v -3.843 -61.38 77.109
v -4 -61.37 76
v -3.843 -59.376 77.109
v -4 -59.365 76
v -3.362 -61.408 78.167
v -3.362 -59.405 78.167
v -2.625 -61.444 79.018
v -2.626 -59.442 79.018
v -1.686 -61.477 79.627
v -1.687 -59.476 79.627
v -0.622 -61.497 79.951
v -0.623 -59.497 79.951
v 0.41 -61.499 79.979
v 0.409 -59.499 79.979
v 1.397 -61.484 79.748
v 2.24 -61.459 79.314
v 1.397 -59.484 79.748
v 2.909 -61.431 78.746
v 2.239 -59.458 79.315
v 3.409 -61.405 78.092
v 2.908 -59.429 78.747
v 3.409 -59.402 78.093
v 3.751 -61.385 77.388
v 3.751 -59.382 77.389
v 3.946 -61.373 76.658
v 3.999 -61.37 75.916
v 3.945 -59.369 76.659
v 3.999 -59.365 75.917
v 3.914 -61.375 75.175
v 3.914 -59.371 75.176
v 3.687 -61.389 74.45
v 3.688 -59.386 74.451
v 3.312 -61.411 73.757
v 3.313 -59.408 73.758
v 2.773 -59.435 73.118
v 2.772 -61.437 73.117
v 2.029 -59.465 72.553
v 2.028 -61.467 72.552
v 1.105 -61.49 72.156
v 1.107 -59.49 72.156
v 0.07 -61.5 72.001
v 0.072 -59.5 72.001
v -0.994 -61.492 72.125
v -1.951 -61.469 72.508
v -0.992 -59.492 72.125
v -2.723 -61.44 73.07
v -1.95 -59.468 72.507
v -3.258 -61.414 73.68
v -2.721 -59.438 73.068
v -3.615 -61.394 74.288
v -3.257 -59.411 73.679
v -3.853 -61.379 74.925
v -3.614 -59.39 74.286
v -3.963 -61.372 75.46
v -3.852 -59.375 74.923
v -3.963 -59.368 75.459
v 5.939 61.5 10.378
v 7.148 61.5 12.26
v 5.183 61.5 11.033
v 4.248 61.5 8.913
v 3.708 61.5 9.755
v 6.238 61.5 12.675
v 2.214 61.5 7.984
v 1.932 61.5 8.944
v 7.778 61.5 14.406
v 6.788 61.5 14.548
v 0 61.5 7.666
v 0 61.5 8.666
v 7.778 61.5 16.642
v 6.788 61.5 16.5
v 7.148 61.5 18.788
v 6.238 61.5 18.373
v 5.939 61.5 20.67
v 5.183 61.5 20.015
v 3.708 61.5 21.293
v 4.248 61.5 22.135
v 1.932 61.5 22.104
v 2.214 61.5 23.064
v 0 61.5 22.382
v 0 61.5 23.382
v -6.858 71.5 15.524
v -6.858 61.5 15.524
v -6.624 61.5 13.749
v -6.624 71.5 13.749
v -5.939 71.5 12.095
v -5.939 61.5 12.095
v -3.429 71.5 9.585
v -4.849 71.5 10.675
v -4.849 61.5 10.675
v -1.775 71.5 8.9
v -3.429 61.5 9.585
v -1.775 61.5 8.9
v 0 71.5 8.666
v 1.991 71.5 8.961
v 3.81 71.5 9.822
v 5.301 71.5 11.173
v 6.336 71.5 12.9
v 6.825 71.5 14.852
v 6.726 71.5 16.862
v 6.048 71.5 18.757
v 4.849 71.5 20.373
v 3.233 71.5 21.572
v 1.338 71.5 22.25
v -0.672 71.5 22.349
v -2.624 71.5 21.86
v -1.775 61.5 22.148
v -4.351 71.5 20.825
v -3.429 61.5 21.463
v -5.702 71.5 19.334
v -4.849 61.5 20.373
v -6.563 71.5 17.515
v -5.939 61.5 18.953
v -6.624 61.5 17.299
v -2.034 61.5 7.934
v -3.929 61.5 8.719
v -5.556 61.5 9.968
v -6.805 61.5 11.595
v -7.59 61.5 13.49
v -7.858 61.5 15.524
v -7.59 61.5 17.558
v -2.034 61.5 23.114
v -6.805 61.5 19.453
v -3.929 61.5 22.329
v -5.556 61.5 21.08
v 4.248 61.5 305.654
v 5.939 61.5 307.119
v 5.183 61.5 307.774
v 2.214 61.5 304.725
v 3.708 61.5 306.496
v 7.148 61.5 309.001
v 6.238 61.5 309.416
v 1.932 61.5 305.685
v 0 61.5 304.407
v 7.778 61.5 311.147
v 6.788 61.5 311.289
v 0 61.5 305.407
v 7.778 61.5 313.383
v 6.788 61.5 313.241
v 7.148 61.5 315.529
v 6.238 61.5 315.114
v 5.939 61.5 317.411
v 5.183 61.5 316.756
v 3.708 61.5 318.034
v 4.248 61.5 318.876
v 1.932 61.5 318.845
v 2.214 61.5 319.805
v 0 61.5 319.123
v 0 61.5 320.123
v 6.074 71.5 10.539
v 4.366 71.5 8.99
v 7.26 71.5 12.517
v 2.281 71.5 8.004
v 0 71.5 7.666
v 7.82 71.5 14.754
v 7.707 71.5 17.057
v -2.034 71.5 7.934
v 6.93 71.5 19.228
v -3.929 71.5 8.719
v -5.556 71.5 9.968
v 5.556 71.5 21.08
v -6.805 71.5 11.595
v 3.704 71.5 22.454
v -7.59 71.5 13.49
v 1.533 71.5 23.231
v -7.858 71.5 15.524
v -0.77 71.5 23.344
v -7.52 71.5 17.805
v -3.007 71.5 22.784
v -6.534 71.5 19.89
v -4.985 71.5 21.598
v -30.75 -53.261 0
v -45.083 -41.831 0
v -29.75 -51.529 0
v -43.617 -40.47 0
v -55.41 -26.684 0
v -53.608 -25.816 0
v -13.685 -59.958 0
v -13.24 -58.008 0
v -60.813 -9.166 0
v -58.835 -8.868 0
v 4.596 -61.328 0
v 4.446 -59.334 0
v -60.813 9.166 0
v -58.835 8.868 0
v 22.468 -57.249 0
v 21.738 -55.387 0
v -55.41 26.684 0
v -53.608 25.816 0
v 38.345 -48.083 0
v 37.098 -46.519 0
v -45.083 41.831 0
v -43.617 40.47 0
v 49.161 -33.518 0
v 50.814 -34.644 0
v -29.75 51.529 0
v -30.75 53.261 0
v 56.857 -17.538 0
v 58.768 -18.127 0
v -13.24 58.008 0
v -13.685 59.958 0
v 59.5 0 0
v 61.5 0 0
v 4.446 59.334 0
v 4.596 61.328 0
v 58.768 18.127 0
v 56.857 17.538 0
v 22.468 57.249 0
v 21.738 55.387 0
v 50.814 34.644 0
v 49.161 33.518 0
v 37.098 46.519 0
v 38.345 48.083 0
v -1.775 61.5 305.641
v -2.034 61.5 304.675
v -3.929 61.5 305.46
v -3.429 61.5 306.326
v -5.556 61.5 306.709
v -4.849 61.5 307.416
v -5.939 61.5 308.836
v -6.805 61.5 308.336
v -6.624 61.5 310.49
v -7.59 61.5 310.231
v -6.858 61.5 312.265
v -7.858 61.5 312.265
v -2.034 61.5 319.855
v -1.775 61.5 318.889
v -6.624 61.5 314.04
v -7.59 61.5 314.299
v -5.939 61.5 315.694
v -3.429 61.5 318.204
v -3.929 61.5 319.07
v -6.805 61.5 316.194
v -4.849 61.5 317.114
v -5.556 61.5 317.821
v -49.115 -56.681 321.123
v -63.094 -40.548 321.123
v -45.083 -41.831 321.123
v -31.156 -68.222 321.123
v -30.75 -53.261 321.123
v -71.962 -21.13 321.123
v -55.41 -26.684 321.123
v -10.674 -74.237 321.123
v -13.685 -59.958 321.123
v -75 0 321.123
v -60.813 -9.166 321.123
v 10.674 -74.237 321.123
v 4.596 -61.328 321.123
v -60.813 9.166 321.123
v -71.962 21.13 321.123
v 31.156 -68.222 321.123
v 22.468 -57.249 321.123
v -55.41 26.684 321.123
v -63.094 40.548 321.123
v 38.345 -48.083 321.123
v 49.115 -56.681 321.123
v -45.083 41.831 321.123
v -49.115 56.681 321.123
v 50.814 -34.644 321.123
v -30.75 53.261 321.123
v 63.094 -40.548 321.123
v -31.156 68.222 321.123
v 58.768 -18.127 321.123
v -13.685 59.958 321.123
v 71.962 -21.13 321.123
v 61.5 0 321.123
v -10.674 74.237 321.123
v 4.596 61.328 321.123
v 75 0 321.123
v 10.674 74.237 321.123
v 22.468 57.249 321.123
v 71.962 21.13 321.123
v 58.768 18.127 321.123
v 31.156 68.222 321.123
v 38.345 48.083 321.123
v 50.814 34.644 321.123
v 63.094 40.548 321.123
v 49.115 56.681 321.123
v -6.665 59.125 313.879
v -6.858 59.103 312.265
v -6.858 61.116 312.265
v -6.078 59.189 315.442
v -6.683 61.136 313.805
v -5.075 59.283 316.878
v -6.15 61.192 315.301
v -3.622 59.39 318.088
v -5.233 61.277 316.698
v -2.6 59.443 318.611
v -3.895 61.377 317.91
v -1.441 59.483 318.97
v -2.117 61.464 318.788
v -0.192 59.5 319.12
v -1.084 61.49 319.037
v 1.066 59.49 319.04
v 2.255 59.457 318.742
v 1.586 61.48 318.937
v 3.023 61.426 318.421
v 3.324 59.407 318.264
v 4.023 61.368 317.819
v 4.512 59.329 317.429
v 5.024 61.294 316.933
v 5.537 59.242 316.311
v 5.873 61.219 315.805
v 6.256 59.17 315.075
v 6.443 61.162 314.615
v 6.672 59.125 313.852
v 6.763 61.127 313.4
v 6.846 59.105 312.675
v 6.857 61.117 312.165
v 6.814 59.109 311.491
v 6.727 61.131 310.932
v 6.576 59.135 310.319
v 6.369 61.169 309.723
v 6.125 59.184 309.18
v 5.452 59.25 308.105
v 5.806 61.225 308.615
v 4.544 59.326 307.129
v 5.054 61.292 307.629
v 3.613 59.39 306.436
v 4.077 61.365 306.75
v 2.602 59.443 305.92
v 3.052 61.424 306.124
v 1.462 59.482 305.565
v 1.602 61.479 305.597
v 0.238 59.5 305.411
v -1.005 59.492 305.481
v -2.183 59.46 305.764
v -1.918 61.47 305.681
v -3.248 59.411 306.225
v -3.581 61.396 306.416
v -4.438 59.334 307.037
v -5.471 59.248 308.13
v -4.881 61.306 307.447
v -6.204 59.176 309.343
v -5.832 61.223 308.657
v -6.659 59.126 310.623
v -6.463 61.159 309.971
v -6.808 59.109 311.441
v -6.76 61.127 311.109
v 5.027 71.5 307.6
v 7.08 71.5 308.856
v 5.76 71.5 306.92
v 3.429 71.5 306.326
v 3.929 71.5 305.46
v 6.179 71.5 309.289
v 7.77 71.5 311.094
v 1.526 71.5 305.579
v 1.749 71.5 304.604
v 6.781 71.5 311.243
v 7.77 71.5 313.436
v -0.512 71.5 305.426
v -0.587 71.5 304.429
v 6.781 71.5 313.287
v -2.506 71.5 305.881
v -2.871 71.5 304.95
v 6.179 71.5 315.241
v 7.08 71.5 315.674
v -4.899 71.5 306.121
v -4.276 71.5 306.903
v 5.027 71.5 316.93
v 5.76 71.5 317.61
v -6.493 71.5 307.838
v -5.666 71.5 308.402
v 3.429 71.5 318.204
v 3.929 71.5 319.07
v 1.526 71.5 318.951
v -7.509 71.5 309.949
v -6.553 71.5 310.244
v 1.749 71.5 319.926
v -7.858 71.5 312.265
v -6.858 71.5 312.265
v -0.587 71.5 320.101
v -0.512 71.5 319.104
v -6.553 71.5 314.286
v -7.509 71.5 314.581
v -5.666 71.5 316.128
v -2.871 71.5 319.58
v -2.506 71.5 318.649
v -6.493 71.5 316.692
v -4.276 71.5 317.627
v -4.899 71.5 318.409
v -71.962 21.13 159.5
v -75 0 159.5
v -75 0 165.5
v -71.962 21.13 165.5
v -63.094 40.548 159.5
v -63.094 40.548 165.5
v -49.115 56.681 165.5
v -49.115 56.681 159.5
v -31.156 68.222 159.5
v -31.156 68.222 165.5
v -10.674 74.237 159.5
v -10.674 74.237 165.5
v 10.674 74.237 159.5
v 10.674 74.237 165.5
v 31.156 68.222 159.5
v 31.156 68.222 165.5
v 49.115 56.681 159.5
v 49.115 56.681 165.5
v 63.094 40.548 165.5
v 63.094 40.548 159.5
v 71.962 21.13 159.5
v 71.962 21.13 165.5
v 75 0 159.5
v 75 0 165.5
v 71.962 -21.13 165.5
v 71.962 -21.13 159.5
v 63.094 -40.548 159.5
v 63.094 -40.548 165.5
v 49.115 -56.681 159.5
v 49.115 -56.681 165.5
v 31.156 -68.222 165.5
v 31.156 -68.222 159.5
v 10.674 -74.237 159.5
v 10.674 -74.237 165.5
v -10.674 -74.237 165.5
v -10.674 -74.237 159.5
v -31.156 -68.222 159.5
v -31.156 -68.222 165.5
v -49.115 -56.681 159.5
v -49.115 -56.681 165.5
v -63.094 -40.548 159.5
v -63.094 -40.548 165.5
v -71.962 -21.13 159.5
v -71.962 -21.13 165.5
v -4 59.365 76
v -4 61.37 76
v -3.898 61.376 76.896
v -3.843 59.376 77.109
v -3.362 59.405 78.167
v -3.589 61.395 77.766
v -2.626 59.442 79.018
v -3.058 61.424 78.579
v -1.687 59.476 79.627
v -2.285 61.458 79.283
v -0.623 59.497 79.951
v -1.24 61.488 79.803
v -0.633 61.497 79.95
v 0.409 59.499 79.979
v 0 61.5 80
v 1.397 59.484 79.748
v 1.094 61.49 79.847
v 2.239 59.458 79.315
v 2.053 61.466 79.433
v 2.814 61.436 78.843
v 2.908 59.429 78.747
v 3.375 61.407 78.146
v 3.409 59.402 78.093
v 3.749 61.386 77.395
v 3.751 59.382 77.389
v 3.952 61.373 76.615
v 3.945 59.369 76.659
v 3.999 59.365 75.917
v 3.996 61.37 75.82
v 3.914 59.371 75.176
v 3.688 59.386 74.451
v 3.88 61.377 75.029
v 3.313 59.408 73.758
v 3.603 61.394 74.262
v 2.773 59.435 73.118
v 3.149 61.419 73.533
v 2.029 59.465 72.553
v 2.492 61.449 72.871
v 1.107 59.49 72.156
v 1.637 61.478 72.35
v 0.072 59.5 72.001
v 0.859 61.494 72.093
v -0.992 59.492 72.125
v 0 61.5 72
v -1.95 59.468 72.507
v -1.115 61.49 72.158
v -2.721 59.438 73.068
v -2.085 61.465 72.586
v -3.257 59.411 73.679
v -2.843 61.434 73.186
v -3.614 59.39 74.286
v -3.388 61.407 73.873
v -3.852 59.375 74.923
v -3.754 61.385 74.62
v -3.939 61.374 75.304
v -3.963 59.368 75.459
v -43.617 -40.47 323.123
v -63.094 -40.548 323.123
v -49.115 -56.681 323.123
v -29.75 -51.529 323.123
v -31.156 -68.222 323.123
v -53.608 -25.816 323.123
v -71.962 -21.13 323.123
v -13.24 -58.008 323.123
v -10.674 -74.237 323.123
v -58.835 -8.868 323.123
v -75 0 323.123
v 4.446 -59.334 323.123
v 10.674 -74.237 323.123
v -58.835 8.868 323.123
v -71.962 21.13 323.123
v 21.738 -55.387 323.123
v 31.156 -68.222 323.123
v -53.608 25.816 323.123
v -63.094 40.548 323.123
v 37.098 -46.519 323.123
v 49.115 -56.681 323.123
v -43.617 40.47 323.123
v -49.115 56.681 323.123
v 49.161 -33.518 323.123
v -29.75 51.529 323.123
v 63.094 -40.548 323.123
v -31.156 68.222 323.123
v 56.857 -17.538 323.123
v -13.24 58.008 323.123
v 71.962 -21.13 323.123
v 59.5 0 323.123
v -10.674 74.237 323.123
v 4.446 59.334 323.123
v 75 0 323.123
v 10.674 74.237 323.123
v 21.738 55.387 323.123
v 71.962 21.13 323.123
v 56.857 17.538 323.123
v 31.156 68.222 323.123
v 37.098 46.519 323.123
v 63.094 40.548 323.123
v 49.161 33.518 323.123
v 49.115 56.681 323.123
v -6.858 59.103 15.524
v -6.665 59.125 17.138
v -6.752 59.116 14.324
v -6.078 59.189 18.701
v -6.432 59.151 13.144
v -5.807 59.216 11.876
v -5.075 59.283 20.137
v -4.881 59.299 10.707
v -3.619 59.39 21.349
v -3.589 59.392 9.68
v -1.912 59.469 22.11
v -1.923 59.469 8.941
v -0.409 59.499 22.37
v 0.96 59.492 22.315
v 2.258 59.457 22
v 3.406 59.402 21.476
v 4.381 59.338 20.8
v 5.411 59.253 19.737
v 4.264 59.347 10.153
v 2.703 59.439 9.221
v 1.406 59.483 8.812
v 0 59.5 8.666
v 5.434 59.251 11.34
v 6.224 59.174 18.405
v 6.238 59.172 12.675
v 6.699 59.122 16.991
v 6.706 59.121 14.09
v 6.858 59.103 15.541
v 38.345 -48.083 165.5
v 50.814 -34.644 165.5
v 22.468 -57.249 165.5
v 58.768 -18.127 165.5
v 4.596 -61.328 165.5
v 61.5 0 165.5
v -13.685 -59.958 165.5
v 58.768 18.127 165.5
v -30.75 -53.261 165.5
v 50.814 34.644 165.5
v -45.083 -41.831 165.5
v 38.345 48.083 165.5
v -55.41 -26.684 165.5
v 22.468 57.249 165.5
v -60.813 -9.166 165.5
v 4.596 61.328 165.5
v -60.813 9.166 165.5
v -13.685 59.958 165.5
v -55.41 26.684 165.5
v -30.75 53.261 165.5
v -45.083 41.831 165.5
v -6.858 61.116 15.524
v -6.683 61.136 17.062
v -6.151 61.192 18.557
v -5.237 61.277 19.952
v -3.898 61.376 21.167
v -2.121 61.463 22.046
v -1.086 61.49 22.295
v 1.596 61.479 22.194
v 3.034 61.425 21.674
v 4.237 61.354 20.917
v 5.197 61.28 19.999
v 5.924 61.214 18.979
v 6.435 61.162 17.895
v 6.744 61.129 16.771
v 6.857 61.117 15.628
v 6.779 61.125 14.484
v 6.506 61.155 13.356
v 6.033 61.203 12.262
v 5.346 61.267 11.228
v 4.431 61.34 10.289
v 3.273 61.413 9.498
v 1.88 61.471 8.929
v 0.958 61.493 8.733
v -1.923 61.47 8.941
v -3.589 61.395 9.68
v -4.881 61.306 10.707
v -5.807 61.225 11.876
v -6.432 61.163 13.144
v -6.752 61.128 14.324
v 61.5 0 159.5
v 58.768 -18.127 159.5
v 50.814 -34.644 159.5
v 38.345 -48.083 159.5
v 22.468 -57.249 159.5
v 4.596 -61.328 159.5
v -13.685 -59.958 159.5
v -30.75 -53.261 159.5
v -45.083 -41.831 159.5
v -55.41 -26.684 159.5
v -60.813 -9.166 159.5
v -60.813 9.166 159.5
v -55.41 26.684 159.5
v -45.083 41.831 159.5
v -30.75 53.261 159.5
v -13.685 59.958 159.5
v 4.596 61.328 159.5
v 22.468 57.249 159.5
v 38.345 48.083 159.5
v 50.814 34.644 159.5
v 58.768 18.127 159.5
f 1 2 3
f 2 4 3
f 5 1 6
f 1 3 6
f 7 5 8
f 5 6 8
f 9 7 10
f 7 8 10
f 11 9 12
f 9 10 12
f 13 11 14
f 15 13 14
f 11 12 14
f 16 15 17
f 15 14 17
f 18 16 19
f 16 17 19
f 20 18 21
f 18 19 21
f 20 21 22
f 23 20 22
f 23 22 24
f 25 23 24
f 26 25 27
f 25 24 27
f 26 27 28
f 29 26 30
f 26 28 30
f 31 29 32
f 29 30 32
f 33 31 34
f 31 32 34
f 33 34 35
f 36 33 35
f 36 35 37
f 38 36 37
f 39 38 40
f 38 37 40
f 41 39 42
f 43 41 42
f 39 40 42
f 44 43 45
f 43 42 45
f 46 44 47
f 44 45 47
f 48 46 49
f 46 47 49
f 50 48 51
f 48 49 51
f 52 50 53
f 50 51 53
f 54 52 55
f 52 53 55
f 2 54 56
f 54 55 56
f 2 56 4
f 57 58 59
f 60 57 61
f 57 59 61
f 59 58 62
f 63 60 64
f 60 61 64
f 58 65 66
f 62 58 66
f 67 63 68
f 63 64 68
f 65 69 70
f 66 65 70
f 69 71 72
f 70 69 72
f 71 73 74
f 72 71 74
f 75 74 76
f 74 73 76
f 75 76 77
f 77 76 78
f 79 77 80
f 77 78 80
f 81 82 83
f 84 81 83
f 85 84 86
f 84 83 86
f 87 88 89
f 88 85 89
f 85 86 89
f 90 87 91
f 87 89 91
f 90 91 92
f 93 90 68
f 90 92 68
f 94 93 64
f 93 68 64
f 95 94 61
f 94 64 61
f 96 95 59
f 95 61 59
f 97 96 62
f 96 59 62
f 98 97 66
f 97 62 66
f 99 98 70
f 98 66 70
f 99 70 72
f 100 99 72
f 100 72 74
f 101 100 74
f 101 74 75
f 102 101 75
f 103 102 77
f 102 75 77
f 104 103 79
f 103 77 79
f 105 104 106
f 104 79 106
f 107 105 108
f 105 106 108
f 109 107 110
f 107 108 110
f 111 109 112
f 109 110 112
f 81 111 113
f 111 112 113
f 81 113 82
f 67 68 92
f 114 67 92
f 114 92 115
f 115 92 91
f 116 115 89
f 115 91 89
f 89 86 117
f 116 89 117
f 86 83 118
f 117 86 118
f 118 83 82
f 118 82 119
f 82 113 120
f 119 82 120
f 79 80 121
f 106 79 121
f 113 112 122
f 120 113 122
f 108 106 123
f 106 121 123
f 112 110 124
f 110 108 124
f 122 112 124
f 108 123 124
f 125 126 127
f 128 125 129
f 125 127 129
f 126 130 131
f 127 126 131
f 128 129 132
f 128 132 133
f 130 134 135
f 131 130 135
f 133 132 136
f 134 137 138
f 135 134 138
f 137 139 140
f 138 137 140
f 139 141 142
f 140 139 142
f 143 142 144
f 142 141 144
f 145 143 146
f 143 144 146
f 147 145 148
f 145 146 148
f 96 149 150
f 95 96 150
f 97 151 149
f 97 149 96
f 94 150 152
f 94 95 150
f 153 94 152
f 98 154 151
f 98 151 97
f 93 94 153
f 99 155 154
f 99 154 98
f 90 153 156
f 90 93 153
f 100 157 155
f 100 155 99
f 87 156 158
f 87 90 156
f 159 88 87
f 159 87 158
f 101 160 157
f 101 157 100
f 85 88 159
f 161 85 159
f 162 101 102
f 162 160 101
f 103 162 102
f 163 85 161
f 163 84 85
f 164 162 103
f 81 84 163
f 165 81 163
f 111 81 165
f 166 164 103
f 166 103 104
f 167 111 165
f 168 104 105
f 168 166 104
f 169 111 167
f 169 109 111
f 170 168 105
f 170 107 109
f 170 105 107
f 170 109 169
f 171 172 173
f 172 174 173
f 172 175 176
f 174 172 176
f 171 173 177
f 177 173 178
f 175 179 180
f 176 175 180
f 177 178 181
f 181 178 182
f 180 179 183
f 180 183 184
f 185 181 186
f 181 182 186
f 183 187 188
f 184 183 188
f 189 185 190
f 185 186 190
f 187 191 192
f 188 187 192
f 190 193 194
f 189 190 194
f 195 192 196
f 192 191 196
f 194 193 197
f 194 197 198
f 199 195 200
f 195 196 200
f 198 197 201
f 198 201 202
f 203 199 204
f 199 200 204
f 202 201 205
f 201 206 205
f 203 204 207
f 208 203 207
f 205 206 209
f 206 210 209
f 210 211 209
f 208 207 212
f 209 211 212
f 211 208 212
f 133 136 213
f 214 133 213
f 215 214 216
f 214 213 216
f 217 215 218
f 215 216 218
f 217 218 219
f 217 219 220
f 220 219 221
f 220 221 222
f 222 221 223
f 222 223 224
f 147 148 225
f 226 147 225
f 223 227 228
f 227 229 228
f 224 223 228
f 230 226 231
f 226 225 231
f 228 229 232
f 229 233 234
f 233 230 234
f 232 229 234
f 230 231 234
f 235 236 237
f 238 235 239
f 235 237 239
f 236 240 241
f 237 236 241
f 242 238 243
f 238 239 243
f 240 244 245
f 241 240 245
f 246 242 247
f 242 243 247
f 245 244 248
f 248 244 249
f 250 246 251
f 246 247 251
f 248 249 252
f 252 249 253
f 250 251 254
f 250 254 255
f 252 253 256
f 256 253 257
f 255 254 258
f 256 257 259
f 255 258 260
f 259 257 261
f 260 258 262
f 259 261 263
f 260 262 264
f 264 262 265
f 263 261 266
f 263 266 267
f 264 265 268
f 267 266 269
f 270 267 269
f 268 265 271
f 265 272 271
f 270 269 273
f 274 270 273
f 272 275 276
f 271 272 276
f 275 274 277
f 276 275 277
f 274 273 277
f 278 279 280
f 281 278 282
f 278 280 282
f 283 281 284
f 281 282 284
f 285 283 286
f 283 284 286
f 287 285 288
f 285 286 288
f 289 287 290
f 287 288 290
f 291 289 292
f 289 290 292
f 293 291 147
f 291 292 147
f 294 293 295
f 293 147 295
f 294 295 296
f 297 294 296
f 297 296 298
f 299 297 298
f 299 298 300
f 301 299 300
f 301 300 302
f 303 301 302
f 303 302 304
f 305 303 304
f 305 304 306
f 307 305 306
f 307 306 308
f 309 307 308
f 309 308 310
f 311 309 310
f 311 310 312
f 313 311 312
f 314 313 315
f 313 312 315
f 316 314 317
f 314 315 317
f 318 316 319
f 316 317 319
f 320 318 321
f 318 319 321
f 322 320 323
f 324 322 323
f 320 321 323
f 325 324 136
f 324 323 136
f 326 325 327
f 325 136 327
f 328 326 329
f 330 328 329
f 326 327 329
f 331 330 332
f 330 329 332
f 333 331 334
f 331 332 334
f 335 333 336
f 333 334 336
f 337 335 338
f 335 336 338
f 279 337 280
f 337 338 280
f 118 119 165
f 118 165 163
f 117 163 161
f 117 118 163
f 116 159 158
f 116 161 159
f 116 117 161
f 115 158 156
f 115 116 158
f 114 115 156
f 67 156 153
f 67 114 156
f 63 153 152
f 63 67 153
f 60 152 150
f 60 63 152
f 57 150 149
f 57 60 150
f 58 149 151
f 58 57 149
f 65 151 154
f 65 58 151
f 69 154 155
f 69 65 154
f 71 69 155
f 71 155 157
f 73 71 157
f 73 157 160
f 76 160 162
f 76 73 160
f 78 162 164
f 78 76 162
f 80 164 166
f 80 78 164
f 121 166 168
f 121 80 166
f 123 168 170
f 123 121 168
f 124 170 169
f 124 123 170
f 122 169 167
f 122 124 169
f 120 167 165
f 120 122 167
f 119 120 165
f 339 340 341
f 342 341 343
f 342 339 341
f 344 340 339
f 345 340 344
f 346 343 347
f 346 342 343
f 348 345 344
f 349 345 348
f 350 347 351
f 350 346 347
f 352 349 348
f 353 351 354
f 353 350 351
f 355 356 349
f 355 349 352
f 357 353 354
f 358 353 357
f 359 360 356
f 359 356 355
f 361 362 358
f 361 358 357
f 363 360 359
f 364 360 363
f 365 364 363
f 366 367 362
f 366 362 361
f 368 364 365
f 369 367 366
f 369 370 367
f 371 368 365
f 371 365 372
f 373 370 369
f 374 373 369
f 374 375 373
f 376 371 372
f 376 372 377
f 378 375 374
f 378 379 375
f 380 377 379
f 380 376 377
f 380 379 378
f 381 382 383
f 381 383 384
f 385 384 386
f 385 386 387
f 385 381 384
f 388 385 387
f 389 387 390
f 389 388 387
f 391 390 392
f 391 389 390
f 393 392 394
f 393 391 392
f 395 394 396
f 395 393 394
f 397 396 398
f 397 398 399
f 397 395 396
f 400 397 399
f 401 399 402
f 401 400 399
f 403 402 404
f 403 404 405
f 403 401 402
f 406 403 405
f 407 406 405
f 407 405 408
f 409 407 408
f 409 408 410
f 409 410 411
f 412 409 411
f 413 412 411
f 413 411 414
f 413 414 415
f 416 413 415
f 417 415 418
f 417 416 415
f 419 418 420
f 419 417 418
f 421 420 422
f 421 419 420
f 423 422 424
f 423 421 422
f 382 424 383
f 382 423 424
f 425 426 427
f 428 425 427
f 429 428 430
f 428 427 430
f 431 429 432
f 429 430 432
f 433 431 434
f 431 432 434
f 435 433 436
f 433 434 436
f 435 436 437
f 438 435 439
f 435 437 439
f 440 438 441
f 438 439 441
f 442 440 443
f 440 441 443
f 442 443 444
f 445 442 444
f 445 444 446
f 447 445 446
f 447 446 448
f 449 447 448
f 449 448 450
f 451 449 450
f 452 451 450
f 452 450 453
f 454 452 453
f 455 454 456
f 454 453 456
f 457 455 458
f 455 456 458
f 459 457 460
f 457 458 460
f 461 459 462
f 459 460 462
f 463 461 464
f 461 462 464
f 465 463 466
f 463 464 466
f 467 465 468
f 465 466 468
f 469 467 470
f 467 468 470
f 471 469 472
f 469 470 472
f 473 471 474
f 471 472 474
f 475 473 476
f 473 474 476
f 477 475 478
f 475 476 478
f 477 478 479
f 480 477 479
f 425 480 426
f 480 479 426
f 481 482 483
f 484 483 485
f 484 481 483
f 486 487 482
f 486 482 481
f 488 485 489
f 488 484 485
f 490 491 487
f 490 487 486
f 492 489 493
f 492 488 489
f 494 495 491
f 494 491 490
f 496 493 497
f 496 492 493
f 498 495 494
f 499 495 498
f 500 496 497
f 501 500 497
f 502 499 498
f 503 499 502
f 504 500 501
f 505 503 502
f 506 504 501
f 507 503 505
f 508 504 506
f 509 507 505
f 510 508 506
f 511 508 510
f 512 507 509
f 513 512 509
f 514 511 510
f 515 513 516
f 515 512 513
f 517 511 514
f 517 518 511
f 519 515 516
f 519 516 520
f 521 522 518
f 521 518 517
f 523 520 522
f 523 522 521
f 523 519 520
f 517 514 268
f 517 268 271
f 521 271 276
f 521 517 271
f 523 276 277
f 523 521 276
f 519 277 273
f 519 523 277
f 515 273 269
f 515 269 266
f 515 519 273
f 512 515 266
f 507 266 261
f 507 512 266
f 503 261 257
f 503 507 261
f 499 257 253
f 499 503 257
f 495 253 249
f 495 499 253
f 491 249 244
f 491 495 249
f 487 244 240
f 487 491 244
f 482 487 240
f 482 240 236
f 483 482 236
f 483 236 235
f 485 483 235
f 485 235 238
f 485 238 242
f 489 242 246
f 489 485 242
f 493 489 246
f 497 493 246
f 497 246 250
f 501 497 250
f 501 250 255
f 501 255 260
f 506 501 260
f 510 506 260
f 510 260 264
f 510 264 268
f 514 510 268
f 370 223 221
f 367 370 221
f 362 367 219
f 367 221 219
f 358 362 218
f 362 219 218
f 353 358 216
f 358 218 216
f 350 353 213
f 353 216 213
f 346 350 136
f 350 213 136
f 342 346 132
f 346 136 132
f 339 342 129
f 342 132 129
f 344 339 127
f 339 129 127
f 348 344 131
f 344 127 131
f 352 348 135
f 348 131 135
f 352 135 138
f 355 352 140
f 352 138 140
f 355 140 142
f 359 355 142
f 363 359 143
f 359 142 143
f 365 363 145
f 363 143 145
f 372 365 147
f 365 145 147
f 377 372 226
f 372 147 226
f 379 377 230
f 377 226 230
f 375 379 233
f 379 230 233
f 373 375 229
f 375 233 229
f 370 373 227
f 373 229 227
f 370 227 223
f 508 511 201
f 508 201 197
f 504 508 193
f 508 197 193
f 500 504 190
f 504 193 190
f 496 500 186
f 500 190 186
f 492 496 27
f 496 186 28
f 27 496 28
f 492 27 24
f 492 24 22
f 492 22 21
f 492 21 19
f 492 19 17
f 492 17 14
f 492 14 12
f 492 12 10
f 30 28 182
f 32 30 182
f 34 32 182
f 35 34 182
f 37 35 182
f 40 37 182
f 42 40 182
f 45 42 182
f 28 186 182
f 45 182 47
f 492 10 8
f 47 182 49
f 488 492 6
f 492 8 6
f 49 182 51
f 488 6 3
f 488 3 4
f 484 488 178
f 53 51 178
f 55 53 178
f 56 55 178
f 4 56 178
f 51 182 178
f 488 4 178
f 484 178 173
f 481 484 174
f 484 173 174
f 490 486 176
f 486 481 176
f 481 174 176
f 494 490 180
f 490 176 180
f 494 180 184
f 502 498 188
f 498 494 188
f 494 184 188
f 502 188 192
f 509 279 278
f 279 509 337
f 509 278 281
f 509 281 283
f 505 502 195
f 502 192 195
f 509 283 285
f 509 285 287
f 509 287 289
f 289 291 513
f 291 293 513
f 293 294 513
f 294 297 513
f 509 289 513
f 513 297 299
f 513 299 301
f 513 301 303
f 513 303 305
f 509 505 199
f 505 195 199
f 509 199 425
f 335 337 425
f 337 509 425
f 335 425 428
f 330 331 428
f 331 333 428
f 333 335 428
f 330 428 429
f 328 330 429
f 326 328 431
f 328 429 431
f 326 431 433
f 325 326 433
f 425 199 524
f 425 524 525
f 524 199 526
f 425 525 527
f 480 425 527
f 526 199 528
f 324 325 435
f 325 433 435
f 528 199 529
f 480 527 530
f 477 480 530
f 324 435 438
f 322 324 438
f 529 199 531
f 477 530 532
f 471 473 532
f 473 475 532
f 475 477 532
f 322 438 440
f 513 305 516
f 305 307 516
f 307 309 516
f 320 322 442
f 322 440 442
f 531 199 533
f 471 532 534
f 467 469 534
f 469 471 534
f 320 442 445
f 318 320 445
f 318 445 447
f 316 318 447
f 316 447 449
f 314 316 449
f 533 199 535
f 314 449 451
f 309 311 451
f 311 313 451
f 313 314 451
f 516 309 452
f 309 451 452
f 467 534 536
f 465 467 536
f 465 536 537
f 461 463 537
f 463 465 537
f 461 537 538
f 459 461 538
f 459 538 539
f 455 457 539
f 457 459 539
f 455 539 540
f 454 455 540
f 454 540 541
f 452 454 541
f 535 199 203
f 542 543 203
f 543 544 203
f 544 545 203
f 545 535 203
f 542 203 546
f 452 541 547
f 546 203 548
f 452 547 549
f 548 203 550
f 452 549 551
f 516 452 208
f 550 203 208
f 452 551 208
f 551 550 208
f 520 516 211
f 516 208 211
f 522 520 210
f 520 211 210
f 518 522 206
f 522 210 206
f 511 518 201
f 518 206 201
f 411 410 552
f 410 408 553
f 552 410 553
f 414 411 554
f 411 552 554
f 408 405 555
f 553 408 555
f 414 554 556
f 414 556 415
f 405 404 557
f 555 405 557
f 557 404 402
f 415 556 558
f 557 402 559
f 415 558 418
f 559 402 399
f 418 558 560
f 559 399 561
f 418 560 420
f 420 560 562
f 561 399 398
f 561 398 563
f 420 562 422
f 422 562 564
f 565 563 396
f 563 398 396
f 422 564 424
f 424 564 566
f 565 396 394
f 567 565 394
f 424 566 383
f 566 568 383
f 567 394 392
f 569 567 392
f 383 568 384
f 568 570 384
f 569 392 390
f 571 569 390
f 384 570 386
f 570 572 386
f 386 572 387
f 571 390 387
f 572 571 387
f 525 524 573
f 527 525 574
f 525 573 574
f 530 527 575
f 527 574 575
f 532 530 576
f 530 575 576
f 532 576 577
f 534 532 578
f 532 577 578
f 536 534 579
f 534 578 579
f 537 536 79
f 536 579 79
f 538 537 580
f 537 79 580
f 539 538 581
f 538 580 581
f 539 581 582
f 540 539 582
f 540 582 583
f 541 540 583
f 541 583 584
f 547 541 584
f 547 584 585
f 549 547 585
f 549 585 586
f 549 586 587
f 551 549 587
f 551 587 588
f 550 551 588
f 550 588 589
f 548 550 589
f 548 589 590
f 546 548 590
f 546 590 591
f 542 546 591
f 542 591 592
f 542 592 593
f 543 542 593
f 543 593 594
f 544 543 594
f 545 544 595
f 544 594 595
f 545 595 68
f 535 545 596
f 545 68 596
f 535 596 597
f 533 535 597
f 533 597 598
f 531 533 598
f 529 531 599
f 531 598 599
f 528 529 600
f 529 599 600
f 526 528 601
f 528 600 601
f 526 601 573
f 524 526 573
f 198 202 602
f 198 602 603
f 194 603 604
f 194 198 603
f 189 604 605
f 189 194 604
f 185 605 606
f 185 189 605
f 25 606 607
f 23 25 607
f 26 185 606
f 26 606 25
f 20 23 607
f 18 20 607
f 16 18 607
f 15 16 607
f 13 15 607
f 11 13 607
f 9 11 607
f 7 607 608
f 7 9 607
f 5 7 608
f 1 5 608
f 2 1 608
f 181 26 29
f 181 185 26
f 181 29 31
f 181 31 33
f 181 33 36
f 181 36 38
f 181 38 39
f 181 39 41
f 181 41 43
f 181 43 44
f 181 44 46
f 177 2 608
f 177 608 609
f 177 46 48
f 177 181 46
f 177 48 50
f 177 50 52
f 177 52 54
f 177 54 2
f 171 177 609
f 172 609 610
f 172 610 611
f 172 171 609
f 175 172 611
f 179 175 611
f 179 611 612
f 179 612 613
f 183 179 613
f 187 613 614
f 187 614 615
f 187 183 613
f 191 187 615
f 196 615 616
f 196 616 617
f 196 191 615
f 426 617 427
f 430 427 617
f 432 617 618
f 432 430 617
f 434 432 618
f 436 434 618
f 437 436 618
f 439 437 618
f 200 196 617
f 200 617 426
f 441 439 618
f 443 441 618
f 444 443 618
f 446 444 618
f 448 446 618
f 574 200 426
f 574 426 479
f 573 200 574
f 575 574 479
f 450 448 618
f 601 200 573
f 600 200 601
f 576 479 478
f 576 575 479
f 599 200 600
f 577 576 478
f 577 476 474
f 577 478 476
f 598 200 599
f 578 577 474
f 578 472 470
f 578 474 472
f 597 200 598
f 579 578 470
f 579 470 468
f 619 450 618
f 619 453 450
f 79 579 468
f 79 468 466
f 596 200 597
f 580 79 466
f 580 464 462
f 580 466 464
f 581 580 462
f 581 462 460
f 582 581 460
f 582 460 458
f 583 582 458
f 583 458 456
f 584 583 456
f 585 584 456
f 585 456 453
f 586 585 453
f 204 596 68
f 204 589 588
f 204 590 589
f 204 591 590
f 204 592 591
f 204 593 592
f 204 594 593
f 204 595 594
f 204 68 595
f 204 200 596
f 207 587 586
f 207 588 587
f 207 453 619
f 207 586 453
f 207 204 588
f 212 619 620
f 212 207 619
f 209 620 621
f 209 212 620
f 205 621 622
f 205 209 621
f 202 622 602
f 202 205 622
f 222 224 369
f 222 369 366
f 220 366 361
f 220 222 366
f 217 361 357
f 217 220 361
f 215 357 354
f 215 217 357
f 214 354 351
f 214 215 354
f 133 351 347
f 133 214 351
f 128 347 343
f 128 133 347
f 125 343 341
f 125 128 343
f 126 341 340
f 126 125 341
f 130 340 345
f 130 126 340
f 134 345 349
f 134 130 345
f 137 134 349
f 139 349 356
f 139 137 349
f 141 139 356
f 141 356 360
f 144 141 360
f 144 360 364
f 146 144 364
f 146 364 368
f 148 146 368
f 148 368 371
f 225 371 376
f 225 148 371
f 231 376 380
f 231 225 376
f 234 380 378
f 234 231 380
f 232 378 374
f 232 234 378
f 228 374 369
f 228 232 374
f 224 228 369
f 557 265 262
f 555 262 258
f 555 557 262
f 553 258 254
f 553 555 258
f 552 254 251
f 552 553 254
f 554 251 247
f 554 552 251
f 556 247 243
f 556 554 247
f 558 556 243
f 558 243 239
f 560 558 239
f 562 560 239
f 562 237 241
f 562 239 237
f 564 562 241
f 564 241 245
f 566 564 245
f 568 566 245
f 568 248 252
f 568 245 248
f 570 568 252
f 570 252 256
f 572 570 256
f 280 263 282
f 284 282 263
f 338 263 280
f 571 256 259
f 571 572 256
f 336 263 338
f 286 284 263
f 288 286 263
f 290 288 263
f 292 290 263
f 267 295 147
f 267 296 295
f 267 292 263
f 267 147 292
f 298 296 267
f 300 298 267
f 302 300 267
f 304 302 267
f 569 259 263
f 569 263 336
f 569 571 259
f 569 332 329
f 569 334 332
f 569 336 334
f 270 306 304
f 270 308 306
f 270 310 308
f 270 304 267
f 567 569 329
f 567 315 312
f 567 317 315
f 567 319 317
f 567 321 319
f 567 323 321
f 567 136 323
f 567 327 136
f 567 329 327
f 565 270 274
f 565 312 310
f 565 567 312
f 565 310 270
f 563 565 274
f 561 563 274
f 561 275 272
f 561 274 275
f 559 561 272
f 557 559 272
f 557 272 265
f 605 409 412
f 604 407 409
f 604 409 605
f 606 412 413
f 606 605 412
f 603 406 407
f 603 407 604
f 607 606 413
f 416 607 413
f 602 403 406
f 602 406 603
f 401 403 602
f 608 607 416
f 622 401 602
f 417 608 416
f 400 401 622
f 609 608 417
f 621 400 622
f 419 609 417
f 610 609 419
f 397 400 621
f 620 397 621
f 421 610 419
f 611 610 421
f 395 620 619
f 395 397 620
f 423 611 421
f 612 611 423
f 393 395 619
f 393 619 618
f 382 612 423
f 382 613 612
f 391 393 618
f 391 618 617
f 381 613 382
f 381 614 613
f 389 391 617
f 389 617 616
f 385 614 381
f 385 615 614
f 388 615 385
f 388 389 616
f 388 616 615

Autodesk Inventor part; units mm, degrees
ref_plane "YZ Plane" through (0, 0, 0) normal (1, 0, 0) x (0, 1, 0)
ref_plane "XY Plane" through (0, 0, 0) normal (0, 0, 1) x (1, 0, 0)
sketch "Sketch1" plane through (0, 0, 0) normal (0, 0, 1) x (1, 0, 0)
  circle A0 centre (0, 0) radius 59.5
  circle A1 centre (0, 0) radius 61.5
  dimension "d0" = 119
  dimension "d1" = 123
extrude "Extrusion1" add sketch "Sketch1" along normal blind 323.123
ref_plane "Work Plane1" through (0, 61.5, 0) normal (0, 1, 0) x (-1, 0, 0)
sketch "Sketch2" plane through (0, 61.5, 0) normal (0, 1, 0) x (-1, 0, 0)
  line L0 (61.5, 0) -> (-61.5, 0) projected
  line L1 (0, 0) -> (0, 4)
  line L2 (0, 4) -> (0, 8.666)
  circle A0 centre (0, 15.524) radius 6.858
  circle A1 centre (0, 15.524) radius 7.858
  dimension "d6" = 4
  dimension "d7" = 4.666
  dimension "d8" = 13.716
  dimension "d9" = 6.858
  dimension "d33" = 15.716
extrude "Extrusion2" cut sketch "Sketch2" against normal blind 23 contours A0
sketch "Sketch3" plane through (0, 61.5, 0) normal (0, 1, 0) x (-1, 0, 0)
  line L0 (0, 0) -> (0, 323.123) construction
  line L1 (-59.5, 323.123) -> (59.5, 323.123) projected
  line L2 (0, 323.123) -> (0, 315.123) construction
  circle A0 centre (0, 312.265) radius 6.858
  circle A1 centre (0, 312.265) radius 7.858
  point P0 (0, 319.123)
  dimension "d12" = 8
  dimension "d13" = 13.716
  dimension "d14" = 6.858
  dimension "d36" = 15.716
extrude "Extrusion3" cut sketch "Sketch3" against normal blind 3 contours A0
thread "Thread1" size "M14x1.25" class "6H" standard "ANSI Metric M Profile" full length
thread "Thread2" size "M14x1.25" class "6H" standard "ANSI Metric M Profile" full length
sketch "Sketch4" plane through (0, 61.5, 0) normal (0, 1, 0) x (-1, 0, 0)
  point P0 (0, 0)
sketch "Sketch5" plane through (0, 61.5, 0) normal (0, 1, 0) x (-1, 0, 0)
  line L0 (0, 0) -> (0, 76) construction
  circle A0 centre (0, 76) radius 4
  dimension "d21" = 76
  dimension "d22" = 8
extrude "Extrusion4" cut sketch "Sketch5" against normal through all
thread "Thread3" size "M8x1.25" class "6H" standard "ANSI Metric M Profile" full length
thread "Thread4" size "M8x1.25" class "6H" standard "ANSI Metric M Profile" full length
sketch "Sketch6" plane through (0, 0, 323.123) normal (0, 0, 1) x (1, 0, 0)
  circle A0 centre (0, 0) radius 75
  circle A1 centre (0, 0) radius 61.5
  dimension "d29" = 150
  dimension "d30" = 123
extrude "Extrusion5" add sketch "Sketch6" against normal blind 2
extrude "Extrusion6" add sketch "Sketch2" along normal blind 10
extrude "Extrusion7" add sketch "Sketch3" along normal blind 10
ref_plane "Work Plane2" through (0, 0, 162.5) normal (0, 0, -1) x (-1, 0, 0)
sketch "Sketch7" plane through (0, 0, 162.5) normal (0, 0, -1) x (-1, 0, 0)
  circle A0 centre (0, 0) radius 75
  circle A1 centre (0, 0) radius 59.5 projected
  circle A2 centre (0, 0) radius 59.5
  dimension "d40" = 150
extrude "Extrusion10" add sketch "Sketch7" along normal blind 3
extrude "Extrusion11" add sketch "Sketch7" against normal blind 3
properties part number "aluminium outer wall" material "Aluminum 6061"
